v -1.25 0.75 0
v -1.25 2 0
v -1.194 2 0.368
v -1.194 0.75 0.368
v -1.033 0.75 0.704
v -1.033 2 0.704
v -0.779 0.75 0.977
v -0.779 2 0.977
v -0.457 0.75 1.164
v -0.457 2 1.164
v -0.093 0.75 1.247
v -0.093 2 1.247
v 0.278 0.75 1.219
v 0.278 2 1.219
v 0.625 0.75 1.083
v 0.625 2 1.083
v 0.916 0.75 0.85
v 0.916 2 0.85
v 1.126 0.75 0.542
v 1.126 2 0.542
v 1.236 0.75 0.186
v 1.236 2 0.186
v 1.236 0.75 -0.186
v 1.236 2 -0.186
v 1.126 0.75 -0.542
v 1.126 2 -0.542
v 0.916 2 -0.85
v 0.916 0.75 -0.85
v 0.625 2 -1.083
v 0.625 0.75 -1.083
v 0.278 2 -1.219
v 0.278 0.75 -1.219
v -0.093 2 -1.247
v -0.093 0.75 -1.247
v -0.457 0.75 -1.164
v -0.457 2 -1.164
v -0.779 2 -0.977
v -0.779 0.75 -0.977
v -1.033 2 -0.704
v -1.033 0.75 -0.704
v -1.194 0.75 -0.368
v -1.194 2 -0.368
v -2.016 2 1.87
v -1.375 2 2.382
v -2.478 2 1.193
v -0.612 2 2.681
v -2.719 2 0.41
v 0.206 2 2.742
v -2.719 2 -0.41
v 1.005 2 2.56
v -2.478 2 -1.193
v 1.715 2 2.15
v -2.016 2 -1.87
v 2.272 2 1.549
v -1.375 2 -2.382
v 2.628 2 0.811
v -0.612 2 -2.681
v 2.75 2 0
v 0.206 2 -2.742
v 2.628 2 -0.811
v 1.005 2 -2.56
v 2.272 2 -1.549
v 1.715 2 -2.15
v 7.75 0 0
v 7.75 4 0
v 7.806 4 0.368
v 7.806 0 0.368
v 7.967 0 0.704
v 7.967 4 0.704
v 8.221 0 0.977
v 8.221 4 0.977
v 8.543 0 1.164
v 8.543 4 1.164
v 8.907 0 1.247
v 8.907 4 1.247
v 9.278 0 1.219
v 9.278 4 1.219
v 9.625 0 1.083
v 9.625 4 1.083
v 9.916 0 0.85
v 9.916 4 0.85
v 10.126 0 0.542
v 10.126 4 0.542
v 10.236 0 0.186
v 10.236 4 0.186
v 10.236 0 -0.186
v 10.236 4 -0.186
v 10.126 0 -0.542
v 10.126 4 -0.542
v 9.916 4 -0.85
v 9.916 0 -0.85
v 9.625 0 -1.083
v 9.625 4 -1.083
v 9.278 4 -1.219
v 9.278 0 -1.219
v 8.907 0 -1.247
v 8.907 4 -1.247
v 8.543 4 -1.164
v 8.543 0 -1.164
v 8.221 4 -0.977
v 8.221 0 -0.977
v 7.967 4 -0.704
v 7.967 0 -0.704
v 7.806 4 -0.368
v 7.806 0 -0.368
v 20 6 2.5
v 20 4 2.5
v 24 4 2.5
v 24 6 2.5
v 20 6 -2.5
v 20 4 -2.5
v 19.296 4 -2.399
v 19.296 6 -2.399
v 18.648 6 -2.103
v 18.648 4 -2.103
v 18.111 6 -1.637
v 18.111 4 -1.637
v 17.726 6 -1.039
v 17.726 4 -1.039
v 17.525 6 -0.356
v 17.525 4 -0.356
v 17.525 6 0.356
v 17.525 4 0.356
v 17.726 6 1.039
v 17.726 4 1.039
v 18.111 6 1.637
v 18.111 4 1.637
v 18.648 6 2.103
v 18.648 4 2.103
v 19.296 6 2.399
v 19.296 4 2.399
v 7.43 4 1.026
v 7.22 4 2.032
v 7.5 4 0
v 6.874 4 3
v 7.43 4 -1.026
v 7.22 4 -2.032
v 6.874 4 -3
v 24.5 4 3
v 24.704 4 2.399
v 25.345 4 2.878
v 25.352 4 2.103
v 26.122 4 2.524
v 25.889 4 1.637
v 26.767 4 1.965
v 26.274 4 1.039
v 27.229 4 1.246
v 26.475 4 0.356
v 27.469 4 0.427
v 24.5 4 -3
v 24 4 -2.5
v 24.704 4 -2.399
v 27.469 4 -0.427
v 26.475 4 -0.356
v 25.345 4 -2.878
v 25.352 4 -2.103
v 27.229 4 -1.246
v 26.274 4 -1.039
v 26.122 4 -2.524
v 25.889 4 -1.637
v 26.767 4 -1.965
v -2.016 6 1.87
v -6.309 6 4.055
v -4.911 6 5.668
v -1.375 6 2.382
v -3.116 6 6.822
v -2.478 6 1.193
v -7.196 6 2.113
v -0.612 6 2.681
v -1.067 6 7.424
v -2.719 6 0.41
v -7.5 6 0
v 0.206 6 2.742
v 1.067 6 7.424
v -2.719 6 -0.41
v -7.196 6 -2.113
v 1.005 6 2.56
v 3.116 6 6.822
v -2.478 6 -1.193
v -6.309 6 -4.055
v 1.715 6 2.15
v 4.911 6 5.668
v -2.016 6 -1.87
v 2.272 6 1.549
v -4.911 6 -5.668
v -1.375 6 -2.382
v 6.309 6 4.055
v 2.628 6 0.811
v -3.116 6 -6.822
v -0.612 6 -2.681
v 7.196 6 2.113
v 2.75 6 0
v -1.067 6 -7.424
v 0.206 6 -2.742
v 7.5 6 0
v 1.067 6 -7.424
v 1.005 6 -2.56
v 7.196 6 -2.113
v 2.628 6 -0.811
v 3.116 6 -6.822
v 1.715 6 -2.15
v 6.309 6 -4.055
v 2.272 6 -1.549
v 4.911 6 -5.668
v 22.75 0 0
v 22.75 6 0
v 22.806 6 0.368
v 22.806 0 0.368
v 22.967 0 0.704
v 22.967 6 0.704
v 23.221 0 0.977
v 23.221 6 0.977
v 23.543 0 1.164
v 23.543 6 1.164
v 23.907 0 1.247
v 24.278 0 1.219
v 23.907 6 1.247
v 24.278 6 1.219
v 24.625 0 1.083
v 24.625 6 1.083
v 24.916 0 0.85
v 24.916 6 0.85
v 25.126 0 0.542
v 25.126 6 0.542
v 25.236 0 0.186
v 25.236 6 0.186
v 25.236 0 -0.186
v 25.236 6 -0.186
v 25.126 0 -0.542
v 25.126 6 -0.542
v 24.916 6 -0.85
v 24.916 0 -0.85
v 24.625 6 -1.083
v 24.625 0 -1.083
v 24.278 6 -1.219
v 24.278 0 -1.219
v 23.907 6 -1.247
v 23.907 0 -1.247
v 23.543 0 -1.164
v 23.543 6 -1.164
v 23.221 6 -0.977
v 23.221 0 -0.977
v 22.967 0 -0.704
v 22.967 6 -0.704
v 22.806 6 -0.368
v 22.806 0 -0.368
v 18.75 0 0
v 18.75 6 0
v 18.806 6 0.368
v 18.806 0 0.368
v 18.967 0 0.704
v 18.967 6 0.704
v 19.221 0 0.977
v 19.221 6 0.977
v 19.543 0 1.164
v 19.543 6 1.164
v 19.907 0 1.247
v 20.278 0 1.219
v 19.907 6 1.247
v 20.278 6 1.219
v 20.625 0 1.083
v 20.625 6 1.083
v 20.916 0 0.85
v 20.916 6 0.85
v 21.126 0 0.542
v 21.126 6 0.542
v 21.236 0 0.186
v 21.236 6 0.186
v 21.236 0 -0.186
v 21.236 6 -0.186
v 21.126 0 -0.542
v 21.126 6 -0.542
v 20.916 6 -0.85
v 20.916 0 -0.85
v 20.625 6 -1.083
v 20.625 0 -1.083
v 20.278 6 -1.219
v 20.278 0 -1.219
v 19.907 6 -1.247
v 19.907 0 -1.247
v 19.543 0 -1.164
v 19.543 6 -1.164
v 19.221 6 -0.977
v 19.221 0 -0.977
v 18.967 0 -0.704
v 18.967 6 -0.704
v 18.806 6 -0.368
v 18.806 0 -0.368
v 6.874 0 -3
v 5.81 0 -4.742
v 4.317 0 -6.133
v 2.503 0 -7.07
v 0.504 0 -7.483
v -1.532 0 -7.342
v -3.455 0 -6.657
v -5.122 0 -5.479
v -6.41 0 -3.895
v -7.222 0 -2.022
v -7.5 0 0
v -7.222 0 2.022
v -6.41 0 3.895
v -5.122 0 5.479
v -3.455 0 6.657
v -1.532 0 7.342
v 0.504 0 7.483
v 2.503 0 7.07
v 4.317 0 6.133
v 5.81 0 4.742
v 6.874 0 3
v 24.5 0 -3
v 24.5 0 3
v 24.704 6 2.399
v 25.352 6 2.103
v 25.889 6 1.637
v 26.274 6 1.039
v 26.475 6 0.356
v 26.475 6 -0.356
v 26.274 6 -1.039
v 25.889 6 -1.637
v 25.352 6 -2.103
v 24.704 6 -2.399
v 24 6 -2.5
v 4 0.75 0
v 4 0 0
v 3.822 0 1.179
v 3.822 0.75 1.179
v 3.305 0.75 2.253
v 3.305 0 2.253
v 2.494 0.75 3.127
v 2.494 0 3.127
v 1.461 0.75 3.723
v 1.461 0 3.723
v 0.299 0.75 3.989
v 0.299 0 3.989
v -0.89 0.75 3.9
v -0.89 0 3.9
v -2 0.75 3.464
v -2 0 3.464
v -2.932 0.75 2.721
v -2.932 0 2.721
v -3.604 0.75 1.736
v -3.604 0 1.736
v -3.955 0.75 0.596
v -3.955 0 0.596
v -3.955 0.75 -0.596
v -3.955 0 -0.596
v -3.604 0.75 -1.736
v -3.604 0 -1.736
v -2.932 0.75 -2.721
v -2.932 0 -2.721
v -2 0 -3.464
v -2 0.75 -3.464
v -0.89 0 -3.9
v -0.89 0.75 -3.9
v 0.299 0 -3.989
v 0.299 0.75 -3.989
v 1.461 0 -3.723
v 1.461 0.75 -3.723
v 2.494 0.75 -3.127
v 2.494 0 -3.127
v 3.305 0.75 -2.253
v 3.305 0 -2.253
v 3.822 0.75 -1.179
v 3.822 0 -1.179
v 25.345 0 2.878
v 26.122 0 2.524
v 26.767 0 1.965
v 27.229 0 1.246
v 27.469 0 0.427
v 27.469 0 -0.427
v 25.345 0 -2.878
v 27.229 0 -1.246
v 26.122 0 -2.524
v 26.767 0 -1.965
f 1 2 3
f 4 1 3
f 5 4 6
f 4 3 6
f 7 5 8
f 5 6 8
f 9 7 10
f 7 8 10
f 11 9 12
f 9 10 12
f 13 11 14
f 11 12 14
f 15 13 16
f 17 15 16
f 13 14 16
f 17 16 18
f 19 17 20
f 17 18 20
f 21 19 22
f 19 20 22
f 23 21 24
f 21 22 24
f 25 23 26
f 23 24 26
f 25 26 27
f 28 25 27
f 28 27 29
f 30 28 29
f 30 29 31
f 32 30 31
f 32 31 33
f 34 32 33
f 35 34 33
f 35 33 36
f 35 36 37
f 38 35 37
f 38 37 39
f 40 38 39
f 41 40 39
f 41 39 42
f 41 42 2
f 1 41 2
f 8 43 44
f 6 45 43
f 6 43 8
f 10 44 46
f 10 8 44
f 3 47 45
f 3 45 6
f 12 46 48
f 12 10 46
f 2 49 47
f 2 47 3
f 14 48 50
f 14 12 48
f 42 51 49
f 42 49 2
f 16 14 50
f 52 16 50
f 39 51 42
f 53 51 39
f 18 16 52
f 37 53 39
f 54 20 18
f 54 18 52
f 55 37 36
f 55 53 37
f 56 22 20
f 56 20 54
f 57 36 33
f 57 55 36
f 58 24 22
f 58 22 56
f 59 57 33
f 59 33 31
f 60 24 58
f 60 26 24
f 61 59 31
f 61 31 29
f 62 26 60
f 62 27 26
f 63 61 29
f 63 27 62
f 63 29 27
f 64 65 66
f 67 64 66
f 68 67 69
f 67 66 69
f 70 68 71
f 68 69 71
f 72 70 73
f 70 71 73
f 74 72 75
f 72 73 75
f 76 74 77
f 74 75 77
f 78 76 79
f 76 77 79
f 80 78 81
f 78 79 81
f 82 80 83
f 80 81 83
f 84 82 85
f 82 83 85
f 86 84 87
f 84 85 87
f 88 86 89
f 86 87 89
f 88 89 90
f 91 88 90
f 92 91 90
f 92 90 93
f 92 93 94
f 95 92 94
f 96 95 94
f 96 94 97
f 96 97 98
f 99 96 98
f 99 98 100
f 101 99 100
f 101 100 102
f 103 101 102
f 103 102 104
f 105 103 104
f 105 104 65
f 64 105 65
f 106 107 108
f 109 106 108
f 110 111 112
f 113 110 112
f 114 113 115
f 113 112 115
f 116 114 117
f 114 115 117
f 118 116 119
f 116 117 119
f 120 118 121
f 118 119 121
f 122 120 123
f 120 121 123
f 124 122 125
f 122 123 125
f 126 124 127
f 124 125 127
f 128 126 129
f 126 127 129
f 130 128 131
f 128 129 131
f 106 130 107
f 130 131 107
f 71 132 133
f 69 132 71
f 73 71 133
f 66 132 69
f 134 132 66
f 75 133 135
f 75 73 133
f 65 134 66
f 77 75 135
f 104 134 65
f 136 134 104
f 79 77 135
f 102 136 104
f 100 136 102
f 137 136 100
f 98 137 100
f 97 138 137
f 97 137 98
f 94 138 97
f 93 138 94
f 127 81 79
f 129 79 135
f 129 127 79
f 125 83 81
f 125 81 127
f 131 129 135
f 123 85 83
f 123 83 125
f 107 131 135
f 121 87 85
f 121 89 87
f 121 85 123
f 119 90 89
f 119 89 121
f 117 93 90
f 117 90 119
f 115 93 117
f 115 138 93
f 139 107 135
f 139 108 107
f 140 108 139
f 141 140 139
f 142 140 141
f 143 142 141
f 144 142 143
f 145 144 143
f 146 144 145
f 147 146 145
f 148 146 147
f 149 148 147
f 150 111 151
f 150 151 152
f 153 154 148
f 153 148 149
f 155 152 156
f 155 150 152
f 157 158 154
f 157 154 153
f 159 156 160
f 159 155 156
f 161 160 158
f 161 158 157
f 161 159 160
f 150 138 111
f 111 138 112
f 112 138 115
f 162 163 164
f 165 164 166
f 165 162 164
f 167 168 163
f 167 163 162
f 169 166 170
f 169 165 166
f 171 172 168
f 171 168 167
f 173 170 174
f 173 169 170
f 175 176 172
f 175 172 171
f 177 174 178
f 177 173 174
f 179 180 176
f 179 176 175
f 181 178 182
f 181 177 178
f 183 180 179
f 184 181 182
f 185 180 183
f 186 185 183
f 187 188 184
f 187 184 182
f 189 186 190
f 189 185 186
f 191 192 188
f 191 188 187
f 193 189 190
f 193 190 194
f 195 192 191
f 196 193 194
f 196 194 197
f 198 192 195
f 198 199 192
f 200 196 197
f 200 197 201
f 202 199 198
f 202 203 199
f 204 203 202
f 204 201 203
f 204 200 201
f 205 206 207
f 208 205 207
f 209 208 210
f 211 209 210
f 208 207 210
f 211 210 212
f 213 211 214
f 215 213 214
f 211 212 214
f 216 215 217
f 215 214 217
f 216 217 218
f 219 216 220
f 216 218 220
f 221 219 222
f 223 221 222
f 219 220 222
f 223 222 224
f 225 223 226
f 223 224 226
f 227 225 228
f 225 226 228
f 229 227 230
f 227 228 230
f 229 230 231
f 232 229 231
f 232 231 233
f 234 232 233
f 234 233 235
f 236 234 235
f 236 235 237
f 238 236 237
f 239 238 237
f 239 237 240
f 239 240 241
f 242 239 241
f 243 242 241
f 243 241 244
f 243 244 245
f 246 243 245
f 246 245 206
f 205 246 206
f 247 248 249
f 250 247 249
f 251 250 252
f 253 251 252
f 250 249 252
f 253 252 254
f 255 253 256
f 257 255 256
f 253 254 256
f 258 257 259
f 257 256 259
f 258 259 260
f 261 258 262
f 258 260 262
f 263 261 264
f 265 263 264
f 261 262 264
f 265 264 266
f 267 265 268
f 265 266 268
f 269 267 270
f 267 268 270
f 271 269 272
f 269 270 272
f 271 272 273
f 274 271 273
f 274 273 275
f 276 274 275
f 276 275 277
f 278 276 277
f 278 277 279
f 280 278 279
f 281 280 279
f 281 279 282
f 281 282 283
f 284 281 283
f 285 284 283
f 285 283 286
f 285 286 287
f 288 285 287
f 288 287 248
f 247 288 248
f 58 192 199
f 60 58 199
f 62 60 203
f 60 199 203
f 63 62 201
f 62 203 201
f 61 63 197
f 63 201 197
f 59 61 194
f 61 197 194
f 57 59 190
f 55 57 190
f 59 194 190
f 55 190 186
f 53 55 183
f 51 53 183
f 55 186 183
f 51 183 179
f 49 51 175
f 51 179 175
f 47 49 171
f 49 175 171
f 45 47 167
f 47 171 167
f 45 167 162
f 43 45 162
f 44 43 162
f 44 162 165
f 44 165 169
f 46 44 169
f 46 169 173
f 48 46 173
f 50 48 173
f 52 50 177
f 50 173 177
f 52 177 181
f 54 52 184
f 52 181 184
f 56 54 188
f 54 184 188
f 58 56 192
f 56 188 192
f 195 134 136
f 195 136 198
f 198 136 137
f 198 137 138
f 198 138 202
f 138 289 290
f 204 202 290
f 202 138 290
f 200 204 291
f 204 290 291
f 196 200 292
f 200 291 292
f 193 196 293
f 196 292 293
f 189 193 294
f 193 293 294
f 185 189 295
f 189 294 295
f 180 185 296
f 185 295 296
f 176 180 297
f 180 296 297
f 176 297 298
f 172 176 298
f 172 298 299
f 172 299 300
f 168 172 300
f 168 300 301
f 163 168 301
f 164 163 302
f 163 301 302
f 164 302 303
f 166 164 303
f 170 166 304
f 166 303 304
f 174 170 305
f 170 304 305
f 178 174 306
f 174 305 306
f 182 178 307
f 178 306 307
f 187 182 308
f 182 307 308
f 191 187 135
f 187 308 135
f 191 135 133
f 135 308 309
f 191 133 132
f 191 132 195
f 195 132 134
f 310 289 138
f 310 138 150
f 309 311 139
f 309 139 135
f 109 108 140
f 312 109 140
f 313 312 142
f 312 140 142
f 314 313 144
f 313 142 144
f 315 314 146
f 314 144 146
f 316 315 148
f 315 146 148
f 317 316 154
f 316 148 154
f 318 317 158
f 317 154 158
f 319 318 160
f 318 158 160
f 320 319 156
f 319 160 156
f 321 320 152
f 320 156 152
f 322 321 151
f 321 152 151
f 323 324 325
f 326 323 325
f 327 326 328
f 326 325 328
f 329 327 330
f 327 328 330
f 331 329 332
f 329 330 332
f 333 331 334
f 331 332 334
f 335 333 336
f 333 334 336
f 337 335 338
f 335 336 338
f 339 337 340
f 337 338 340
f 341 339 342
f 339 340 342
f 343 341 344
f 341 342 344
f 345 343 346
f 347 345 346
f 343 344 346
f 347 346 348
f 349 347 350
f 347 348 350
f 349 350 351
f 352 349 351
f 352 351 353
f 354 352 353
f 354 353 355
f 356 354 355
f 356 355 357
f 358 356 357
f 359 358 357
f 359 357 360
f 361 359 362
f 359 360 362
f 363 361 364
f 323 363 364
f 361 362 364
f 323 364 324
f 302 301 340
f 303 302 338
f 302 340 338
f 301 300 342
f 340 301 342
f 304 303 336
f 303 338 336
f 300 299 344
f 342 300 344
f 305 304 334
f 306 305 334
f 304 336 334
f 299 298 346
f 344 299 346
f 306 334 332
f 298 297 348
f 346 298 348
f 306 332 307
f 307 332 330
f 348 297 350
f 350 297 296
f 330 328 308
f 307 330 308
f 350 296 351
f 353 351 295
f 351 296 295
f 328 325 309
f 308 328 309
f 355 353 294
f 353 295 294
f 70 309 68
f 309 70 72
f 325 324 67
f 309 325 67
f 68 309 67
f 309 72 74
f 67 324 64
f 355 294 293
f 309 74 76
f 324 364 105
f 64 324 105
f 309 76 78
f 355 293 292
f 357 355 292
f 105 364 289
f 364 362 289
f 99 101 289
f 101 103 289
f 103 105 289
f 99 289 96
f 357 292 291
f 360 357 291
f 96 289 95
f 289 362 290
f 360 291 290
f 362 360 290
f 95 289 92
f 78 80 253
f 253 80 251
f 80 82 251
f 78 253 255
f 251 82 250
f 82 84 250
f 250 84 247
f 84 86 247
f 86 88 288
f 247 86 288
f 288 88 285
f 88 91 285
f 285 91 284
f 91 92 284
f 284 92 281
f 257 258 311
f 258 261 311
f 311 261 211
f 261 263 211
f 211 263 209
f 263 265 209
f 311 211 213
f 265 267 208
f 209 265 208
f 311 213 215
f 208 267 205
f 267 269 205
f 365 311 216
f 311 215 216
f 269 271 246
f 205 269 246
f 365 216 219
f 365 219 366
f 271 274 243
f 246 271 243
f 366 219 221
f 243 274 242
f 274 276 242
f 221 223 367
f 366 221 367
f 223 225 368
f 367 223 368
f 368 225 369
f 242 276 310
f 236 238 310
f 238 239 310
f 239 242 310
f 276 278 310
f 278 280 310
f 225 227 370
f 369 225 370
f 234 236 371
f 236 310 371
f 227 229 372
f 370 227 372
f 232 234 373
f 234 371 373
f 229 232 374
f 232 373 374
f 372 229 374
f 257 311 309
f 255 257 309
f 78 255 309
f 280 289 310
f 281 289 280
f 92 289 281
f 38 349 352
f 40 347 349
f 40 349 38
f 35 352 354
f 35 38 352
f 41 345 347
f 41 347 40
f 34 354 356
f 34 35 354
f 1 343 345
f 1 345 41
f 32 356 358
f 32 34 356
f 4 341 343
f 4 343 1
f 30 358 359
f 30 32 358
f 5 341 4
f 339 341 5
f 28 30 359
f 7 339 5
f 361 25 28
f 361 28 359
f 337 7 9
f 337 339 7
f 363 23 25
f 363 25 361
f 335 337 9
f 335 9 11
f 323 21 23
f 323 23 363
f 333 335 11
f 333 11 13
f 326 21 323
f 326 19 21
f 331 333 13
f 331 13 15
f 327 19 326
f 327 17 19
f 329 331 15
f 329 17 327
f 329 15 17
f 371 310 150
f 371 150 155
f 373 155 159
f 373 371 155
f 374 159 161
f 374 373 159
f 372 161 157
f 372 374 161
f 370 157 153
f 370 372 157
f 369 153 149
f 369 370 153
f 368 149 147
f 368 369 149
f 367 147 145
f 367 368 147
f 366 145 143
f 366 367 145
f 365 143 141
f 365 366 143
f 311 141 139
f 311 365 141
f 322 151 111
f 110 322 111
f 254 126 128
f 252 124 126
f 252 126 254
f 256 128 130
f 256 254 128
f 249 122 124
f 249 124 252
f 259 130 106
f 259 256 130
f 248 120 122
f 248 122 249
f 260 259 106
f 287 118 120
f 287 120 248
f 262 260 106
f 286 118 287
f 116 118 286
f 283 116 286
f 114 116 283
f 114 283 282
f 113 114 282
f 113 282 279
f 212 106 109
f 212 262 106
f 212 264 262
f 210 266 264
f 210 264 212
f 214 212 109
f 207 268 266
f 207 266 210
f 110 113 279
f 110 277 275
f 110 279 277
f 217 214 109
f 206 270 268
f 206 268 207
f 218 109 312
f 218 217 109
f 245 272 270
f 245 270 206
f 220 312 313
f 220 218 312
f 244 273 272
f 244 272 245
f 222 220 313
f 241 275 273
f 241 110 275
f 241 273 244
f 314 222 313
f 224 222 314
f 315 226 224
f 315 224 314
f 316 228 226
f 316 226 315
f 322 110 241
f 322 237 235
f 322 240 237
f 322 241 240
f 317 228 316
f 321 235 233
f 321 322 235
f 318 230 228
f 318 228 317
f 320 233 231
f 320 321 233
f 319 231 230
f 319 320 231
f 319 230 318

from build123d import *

# Parameters (mm, degrees)
SKETCH_1_R               = 7.5
EXTRUDE_1_DEPTH          = 4
SKETCH_1_3_R             = 7.5
EXTRUDE_2_DEPTH          = 6
EXTRUDE_3_DEPTH          = 2
HOLE_WIZARD_M3_1_D       = 2.5
SKETCH_5_R               = 2.75
CUT_EXTRUDE_1_DEPTH      = 1
CUT_EXTRUDE_1_DEPTH_BACK = 4
SKETCH_6_R               = 4
CUT_EXTRUDE_2_DEPTH      = 0.75


with BuildPart() as part:
    # 草图1 → 凸台-拉伸1 (new body)
    with BuildSketch(Plane(origin=(0, 0, 0), x_dir=(1, 0, 0), z_dir=(0, 1, 0))):
        Circle(SKETCH_1_R)
        with BuildLine():
            Line((0, 3), (24.5, 3))
            ThreePointArc((24.5, 3), (27.5, 0), (24.5, -3))
            Line((24.5, -3), (0, -3))
            ThreePointArc((0, -3), (-3, 0), (0, 3))
        make_face()
    extrude(amount=EXTRUDE_1_DEPTH)

    # 草图1<3> → 凸台-拉伸2 (add)
    with BuildSketch(Plane(origin=(0, 0, 0), x_dir=(1, 0, 0), z_dir=(0, 1, 0))):
        Circle(SKETCH_1_3_R)
    extrude(amount=EXTRUDE_2_DEPTH)

    # 草图2 → 凸台-拉伸3 (add)
    with BuildSketch(Plane(origin=(0, 4, 0), x_dir=(1, 0, 0), z_dir=(0, 1, 0))):
        with BuildLine():
            Line((20, -2.5), (24, -2.5))
            ThreePointArc((24, -2.5), (26.5, 0), (24, 2.5))
            Line((24, 2.5), (20, 2.5))
            ThreePointArc((20, 2.5), (17.5, 0), (20, -2.5))
        make_face()
    extrude(amount=EXTRUDE_3_DEPTH)

    # M3 螺纹孔1 (through all)
    with Locations(Plane.XZ):
        with Locations((20, 0), (24, 0), (0, 0), (9, 0)):
            Hole(HOLE_WIZARD_M3_1_D / 2)

    # 草图5 → 切除-拉伸1 (cut, two sides)
    with BuildSketch(Plane(origin=(0, 6, 0), x_dir=(1, 0, 0), z_dir=(0, 1, 0))) as cut_extrude_1_sk:
        Circle(SKETCH_5_R)
    extrude(amount=CUT_EXTRUDE_1_DEPTH, mode=Mode.SUBTRACT)
    extrude(cut_extrude_1_sk.sketch, amount=-CUT_EXTRUDE_1_DEPTH_BACK, mode=Mode.SUBTRACT)

    # 草图6 → 切除-拉伸2 (cut)
    with BuildSketch(Plane.XZ):
        Circle(SKETCH_6_R)
    extrude(amount=-CUT_EXTRUDE_2_DEPTH, mode=Mode.SUBTRACT)


solid = part.part
